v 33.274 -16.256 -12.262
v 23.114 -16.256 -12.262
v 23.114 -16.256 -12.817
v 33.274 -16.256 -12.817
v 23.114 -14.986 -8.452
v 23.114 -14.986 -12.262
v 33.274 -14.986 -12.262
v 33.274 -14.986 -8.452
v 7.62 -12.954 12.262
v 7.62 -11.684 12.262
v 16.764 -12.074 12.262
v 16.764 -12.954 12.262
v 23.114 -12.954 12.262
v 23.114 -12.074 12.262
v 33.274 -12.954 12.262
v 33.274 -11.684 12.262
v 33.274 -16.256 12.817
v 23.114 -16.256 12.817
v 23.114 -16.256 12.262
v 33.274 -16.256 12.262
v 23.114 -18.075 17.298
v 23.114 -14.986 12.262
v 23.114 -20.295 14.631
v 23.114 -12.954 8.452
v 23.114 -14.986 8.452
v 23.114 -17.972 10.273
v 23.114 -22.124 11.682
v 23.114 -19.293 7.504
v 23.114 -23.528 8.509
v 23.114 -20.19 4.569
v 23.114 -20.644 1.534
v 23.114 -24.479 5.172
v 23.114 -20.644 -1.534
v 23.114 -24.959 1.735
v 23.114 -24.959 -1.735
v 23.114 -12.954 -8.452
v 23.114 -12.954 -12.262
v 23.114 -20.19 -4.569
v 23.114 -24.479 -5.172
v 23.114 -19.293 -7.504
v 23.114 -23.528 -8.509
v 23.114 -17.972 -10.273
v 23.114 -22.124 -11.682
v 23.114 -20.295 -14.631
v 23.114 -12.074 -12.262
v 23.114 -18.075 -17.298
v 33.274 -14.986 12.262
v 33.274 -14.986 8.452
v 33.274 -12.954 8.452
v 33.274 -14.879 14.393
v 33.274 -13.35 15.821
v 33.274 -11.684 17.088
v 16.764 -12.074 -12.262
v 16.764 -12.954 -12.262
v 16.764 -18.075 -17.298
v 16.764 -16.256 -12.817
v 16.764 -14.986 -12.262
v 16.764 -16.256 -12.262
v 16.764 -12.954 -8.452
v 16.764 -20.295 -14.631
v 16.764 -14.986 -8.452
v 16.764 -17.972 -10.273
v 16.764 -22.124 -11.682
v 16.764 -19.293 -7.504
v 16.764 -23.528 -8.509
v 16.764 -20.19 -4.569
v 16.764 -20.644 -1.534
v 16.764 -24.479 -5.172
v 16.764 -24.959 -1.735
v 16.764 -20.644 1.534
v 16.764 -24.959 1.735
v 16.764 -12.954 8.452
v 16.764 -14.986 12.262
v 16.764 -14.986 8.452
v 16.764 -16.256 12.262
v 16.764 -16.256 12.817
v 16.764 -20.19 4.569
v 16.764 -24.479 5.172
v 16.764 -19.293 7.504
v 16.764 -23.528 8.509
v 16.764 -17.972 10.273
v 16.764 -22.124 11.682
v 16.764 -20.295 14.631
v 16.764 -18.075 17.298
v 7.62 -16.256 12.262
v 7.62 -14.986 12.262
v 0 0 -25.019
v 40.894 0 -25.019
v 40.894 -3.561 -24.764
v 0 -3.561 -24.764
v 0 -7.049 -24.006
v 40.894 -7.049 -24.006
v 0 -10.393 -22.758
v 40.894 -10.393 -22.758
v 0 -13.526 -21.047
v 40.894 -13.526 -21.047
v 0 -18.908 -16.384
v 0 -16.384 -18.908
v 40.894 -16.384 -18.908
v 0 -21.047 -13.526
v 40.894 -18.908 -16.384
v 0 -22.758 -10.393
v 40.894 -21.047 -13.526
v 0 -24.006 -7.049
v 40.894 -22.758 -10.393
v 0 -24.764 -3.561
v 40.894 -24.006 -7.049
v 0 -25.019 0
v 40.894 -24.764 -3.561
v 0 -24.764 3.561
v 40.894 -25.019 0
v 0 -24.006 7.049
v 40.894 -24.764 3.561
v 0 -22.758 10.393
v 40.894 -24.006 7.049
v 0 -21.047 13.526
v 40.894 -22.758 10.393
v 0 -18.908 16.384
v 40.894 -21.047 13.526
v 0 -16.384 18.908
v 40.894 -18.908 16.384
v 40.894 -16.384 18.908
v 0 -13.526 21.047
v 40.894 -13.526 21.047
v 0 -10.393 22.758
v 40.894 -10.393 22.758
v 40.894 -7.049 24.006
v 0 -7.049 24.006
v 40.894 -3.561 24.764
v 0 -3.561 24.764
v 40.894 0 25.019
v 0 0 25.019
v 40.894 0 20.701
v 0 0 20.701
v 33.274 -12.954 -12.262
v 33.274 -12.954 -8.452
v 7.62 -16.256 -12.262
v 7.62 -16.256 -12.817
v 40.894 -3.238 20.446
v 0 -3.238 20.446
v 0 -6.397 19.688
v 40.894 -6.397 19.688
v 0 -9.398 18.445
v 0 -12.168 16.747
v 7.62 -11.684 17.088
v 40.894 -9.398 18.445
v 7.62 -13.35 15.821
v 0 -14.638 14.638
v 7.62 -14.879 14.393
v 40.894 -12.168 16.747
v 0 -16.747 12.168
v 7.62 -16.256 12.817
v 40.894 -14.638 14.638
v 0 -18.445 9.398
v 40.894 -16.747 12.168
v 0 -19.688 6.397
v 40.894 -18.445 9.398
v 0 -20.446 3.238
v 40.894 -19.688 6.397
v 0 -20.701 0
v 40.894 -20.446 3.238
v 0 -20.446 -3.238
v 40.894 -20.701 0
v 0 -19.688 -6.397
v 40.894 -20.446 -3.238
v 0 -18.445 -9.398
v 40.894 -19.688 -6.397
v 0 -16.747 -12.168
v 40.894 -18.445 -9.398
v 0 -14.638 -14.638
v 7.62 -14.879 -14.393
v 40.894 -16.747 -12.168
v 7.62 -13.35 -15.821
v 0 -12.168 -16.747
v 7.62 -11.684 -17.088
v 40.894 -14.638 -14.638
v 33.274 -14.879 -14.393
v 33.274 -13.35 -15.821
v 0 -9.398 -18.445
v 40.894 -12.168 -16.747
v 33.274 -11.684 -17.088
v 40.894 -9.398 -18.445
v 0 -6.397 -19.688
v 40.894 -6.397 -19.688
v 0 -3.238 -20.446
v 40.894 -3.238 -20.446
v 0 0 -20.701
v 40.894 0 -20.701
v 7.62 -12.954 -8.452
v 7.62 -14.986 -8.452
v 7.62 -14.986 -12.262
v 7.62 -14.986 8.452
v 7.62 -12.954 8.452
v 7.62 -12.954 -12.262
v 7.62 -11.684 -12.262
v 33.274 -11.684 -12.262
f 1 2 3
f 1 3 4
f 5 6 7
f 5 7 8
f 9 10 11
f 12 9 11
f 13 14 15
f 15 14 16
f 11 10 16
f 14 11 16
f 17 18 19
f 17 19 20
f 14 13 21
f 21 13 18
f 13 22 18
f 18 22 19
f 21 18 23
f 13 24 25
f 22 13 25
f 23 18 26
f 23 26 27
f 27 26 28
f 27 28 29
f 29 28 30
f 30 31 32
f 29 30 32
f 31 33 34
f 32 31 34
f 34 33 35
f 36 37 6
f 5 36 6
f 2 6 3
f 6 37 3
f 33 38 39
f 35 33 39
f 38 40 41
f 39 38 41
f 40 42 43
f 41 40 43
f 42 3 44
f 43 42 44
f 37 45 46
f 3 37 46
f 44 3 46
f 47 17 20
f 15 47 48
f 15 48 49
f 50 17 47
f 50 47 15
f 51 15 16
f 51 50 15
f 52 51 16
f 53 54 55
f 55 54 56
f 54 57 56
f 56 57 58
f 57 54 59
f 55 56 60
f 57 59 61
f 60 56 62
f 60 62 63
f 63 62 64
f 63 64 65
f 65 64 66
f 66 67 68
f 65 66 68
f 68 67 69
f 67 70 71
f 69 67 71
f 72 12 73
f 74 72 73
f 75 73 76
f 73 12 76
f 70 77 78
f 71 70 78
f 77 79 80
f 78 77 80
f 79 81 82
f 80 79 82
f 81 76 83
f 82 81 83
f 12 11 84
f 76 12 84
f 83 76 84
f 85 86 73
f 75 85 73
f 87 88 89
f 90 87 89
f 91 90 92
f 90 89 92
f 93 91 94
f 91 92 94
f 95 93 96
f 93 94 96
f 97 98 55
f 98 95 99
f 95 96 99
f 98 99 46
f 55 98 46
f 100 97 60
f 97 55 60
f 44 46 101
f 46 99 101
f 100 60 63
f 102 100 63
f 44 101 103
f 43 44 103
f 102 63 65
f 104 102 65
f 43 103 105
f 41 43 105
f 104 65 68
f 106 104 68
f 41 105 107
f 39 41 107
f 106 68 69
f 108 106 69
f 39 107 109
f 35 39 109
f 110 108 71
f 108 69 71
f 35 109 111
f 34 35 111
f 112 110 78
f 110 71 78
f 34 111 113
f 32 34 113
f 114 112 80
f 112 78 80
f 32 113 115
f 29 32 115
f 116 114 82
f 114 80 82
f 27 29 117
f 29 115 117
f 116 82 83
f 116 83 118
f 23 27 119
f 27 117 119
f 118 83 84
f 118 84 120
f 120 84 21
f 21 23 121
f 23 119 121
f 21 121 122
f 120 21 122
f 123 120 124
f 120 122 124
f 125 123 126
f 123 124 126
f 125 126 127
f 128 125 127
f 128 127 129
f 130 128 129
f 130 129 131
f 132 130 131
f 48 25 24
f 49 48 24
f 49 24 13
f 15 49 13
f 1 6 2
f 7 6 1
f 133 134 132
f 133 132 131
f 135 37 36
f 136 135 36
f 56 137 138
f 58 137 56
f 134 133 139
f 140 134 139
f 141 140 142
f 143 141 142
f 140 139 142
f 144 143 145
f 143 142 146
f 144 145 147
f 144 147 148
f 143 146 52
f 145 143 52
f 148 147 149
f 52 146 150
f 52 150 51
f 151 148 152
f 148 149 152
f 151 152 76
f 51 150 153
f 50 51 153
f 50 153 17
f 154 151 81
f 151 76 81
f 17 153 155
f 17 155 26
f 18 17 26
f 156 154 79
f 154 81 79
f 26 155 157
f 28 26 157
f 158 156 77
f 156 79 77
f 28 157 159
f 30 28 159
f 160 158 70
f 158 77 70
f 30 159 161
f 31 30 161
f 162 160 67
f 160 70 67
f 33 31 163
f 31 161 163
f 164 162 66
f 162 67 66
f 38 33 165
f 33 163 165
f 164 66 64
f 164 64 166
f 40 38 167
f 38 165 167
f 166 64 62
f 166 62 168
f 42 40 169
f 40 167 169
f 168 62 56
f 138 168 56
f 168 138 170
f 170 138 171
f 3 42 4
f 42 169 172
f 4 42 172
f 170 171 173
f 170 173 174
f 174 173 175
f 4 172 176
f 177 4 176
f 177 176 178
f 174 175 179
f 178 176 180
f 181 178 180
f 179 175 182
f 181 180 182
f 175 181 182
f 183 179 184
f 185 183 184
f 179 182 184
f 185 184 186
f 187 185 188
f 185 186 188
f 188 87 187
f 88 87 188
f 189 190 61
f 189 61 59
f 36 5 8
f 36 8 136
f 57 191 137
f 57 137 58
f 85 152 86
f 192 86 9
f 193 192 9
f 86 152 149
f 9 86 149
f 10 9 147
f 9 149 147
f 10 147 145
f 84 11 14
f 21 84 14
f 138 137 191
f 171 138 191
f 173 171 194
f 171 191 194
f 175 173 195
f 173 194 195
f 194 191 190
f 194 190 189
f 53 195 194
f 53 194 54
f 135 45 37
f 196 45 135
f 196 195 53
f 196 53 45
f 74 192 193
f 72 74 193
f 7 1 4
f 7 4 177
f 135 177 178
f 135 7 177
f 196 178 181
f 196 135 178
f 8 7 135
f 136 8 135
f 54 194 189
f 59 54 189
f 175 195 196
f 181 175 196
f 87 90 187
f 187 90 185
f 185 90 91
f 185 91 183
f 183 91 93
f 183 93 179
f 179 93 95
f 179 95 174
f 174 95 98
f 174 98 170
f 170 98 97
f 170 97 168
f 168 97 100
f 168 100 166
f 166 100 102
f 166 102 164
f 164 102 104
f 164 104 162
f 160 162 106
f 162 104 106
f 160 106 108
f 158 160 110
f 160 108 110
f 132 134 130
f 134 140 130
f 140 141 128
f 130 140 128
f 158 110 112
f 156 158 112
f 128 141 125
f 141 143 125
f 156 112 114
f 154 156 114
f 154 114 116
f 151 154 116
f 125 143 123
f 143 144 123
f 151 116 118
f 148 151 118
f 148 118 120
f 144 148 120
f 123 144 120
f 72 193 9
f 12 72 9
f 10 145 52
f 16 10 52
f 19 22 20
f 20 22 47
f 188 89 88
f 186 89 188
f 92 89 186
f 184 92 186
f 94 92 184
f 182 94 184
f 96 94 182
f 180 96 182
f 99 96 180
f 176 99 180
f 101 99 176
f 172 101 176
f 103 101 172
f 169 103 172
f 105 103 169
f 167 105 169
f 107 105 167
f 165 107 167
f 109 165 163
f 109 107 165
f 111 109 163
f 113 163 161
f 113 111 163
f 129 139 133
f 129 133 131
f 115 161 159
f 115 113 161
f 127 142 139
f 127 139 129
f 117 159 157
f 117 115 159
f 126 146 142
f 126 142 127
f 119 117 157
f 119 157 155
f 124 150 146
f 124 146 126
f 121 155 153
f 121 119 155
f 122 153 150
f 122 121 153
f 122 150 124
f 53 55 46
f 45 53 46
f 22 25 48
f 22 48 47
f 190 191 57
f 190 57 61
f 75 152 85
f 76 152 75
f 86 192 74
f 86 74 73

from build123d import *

# Parameters (mm, degrees)
SKETCH1_W                       = 40.894
SKETCH1_H                       = 25.4
REVOLVE1_ANGLE                  = 180
BOSS_EXTRUDE1_REACH             = 27.4
SKETCH3_W                       = 25.654
SKETCH3_H                       = 4.572
BOSS_EXTRUDE1_DIRECTION_2_REACH = 27.4
SKETCH4_W                       = 25.654
SKETCH4_H                       = 24.524924672
CUT_EXTRUDE1_DEPTH              = 4.572
SKETCH5_W                       = 3.81
SKETCH5_H                       = 2.032
BOSS_EXTRUDE2_DEPTH             = 25.654
SKETCH8_W                       = 6.35
SKETCH8_H                       = 30.865764514
CUT_REVOLVE2_ANGLE              = 40
CUT_REVOLVE2_OTHER_WAY_ANGLE    = 40
CUT_EXTRUDE3_DEPTH              = 45.72


with BuildPart() as part:
    # Sketch1 → Revolve1 (revolve)
    with BuildSketch(Plane(origin=(0, 0, 0), x_dir=(1, 0, 0), z_dir=(0, 1, 0))):
        with Locations((20.447, -12.7)):
            Rectangle(SKETCH1_W, SKETCH1_H)
    revolve(axis=Axis((0, 0, 0), (1, 0, 0)), revolution_arc=REVOLVE1_ANGLE)

    # Sketch2 → Cut-Revolve1 (revolve, cut)
    with BuildSketch(Plane(origin=(0, 0, 0), x_dir=(1, 0, 0), z_dir=(0, 1, 0))):
        Polygon((0, 0), (41.402, 0), (41.402, -20.701), (40.132, -20.701), (1.27, -20.701), (0, -20.701), align=None)
    revolve(axis=Axis((0, 0, 0), (1, 0, 0)), mode=Mode.SUBTRACT)

    # Sketch3 → Boss-Extrude1 (add, up to next)
    with BuildSketch(Plane.XY, mode=Mode.PRIVATE) as boss_extrude1_sk1:
        with Locations((20.447, -13.97)):
            Rectangle(SKETCH3_W, SKETCH3_H)
    boss_extrude1_tool1 = extrude(boss_extrude1_sk1.sketch, amount=BOSS_EXTRUDE1_REACH, mode=Mode.PRIVATE) - part.part
    add(boss_extrude1_tool1.solids().sort_by_distance((20.447, -13.97, 0))[0])

    # Sketch3 → Boss-Extrude1 direction 2 (add, up to next)
    with BuildSketch(Plane.XY, mode=Mode.PRIVATE) as boss_extrude1_direction_2_sk1:
        with Locations((20.447, -13.97)):
            Rectangle(SKETCH3_W, SKETCH3_H)
    boss_extrude1_direction_2_tool1 = extrude(boss_extrude1_direction_2_sk1.sketch, amount=-BOSS_EXTRUDE1_DIRECTION_2_REACH, mode=Mode.PRIVATE) - part.part
    add(boss_extrude1_direction_2_tool1.solids().sort_by_distance((20.447, -13.97, 0))[0])

    # Sketch4 → Cut-Extrude1 (cut)
    with BuildSketch(Plane(origin=(0, -11.684, 0), x_dir=(1, 0, 0), z_dir=(0, 1, 0))):
        with Locations((20.447, 0)):
            Rectangle(SKETCH4_W, SKETCH4_H)
    extrude(amount=-CUT_EXTRUDE1_DEPTH, mode=Mode.SUBTRACT)

    # Sketch5 → Boss-Extrude2 (add)
    with BuildSketch(Plane.ZY.offset(-7.62)):
        with Locations((-10.357462336, -13.97)):
            Rectangle(SKETCH5_W, SKETCH5_H)
        with Locations((10.357462336, -13.97)):
            Rectangle(SKETCH5_W, SKETCH5_H)
    extrude(amount=-BOSS_EXTRUDE2_DEPTH)

    # Sketch8 → Cut-Revolve2 (revolve, cut)
    with BuildSketch(Plane.XY):
        with Locations((19.939, -12.892882257)):
            Rectangle(SKETCH8_W, SKETCH8_H)
    revolve(axis=Axis((23.114, 2.54, 0), (-1, 0, 0)), revolution_arc=CUT_REVOLVE2_ANGLE, mode=Mode.SUBTRACT)

    # Sketch8 → Cut-Revolve2 other way (revolve, cut)
    with BuildSketch(Plane.XY):
        with Locations((19.939, -12.892882257)):
            Rectangle(SKETCH8_W, SKETCH8_H)
    revolve(axis=Axis((23.114, 2.54, 0), (1, 0, 0)), revolution_arc=CUT_REVOLVE2_OTHER_WAY_ANGLE, mode=Mode.SUBTRACT)

    # Sketch9 → Cut-Extrude3 (cut)
    with BuildSketch(Plane(origin=(40.894, 0, 0), x_dir=(0, 0, -1), z_dir=(1, 0, 0))):
        with BuildLine():
            ThreePointArc((25.019, 0), (0, -25.019), (-25.019, 0))
            Line((-25.019, 0), (-25.4, 0))
            ThreePointArc((-25.4, 0), (0, -25.4), (25.4, 0))
            Line((25.4, 0), (25.019, 0))
        make_face()
    extrude(amount=-CUT_EXTRUDE3_DEPTH, mode=Mode.SUBTRACT)


solid = part.part
